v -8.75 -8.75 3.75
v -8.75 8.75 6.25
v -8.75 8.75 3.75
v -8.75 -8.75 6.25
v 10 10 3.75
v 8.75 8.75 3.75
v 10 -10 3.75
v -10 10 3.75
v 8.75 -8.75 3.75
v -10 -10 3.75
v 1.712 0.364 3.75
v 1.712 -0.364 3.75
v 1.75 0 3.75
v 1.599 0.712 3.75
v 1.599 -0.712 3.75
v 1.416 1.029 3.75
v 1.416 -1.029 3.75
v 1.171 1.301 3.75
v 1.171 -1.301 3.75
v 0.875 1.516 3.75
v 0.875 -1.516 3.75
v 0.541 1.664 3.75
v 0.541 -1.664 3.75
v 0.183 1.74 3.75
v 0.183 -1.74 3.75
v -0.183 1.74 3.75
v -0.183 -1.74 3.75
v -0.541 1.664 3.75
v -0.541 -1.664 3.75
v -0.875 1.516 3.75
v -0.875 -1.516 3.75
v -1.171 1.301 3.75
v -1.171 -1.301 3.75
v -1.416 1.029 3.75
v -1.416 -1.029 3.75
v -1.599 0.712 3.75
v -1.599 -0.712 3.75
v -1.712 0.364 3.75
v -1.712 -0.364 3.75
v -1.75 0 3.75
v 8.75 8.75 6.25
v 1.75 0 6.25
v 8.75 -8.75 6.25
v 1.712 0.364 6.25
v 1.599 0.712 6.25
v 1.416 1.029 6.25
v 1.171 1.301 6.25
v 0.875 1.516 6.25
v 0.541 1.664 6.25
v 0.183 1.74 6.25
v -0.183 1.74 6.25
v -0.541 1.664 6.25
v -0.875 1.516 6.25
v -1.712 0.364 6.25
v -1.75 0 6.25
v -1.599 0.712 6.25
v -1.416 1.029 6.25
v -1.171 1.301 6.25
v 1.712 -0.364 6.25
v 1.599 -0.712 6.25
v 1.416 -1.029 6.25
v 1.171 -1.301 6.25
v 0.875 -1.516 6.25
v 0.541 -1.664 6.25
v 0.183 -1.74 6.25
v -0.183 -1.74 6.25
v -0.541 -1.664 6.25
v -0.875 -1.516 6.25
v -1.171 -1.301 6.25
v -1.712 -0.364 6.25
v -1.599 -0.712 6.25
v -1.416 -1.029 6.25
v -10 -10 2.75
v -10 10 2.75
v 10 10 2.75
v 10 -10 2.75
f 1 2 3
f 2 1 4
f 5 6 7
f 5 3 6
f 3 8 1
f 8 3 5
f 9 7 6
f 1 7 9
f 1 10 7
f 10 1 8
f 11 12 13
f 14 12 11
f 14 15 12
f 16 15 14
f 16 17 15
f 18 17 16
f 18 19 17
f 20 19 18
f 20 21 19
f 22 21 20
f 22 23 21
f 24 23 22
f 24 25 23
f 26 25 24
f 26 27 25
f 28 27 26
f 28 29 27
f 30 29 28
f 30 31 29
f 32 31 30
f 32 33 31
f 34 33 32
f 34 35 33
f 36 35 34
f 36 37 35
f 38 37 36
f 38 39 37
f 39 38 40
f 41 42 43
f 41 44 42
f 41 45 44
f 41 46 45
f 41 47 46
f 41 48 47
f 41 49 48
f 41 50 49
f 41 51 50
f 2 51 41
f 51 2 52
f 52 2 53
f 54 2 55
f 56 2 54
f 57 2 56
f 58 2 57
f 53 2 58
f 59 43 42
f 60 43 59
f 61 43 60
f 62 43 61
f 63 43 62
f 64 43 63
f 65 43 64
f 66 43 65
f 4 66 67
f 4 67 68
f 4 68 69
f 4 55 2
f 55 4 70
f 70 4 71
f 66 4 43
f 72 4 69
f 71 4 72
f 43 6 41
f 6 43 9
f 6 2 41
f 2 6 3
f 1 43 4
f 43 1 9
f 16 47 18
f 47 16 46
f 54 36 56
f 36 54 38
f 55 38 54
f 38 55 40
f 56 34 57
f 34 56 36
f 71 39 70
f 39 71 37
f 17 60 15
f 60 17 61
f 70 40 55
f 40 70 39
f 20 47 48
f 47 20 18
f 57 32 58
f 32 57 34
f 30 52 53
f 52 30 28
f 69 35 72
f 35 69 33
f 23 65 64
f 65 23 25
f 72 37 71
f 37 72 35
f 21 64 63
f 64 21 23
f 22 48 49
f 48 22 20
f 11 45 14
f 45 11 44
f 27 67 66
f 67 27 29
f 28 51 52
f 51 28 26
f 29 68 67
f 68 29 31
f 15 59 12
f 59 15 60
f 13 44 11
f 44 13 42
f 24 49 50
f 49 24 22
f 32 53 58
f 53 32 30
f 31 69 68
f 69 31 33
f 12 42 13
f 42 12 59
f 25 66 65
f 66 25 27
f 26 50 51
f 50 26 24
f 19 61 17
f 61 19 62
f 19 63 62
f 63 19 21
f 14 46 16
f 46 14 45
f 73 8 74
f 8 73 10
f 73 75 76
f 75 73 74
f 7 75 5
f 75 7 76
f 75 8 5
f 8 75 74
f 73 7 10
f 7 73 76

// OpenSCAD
capOuterWidth = 20;
capOuterHeight = 7;
holeRadius = 3.5/2;
holeHeight = 2.5;
wallThickness = 1;
tightMargin = 0.5;
margin = 1;

module cap() {
  $fn = 30;
  innerWidth = capOuterWidth - wallThickness;
  ceilingHeight = holeHeight + wallThickness;
  translate([0, 0, capOuterHeight/2])
  difference() {
    translate([0, 0, 0])
    cube([capOuterWidth, capOuterWidth, capOuterHeight], center=true);
    translate([0, 0, -ceilingHeight])
    cube([innerWidth, innerWidth, capOuterHeight], center=true);
    translate([0, 0, capOuterHeight/2-ceilingHeight+holeHeight/2])
    cylinder(h = holeHeight+1, r = holeRadius, center = true);
  }
}

module capTop() {
  $fn = 30;
  innerWidth = capOuterWidth - wallThickness*2 - tightMargin;
  ceilingHeight = holeHeight;
  //translate([0, 0, capOuterHeight/2])
  union() {
    translate([0, 0, ceilingHeight/2+wallThickness/2])
    cube([capOuterWidth, capOuterWidth, wallThickness], center=true);
    translate([0, 0, 0])
    difference() {
      cube([innerWidth, innerWidth, ceilingHeight], center=true);
      translate([0, 0, holeHeight-margin/2-ceilingHeight])
      cylinder(h = holeHeight+margin, r = holeRadius, center = true);
    }
  }
}

module capBottom() {
  $fn = 30;
  innerWidth = capOuterWidth - wallThickness*2;
  height = capOuterHeight - wallThickness - tightMargin;
  translate([0, 0, capOuterHeight/2])
  difference() {
    union() {
      translate([0, 0, 0])
      cube([capOuterWidth, capOuterWidth, height], center=true);
      translate([0, 0, wallThickness/2])
      cube([capOuterWidth/2, capOuterWidth+wallThickness*2, wallThickness], center=true);
      translate([0, 0, wallThickness/2])
      cube([capOuterWidth+wallThickness*2, capOuterWidth/2, wallThickness], center=true);
    }
    translate([0, 0, 0])
    cube([innerWidth, innerWidth, height+margin], center=true);
  }
}

*rotate(a = [0, 180, 0])
cap();

translate([0, 0, 5])
rotate(a = [0, 180, 0])
capTop();

*translate([0, 0, -5])
capBottom();
